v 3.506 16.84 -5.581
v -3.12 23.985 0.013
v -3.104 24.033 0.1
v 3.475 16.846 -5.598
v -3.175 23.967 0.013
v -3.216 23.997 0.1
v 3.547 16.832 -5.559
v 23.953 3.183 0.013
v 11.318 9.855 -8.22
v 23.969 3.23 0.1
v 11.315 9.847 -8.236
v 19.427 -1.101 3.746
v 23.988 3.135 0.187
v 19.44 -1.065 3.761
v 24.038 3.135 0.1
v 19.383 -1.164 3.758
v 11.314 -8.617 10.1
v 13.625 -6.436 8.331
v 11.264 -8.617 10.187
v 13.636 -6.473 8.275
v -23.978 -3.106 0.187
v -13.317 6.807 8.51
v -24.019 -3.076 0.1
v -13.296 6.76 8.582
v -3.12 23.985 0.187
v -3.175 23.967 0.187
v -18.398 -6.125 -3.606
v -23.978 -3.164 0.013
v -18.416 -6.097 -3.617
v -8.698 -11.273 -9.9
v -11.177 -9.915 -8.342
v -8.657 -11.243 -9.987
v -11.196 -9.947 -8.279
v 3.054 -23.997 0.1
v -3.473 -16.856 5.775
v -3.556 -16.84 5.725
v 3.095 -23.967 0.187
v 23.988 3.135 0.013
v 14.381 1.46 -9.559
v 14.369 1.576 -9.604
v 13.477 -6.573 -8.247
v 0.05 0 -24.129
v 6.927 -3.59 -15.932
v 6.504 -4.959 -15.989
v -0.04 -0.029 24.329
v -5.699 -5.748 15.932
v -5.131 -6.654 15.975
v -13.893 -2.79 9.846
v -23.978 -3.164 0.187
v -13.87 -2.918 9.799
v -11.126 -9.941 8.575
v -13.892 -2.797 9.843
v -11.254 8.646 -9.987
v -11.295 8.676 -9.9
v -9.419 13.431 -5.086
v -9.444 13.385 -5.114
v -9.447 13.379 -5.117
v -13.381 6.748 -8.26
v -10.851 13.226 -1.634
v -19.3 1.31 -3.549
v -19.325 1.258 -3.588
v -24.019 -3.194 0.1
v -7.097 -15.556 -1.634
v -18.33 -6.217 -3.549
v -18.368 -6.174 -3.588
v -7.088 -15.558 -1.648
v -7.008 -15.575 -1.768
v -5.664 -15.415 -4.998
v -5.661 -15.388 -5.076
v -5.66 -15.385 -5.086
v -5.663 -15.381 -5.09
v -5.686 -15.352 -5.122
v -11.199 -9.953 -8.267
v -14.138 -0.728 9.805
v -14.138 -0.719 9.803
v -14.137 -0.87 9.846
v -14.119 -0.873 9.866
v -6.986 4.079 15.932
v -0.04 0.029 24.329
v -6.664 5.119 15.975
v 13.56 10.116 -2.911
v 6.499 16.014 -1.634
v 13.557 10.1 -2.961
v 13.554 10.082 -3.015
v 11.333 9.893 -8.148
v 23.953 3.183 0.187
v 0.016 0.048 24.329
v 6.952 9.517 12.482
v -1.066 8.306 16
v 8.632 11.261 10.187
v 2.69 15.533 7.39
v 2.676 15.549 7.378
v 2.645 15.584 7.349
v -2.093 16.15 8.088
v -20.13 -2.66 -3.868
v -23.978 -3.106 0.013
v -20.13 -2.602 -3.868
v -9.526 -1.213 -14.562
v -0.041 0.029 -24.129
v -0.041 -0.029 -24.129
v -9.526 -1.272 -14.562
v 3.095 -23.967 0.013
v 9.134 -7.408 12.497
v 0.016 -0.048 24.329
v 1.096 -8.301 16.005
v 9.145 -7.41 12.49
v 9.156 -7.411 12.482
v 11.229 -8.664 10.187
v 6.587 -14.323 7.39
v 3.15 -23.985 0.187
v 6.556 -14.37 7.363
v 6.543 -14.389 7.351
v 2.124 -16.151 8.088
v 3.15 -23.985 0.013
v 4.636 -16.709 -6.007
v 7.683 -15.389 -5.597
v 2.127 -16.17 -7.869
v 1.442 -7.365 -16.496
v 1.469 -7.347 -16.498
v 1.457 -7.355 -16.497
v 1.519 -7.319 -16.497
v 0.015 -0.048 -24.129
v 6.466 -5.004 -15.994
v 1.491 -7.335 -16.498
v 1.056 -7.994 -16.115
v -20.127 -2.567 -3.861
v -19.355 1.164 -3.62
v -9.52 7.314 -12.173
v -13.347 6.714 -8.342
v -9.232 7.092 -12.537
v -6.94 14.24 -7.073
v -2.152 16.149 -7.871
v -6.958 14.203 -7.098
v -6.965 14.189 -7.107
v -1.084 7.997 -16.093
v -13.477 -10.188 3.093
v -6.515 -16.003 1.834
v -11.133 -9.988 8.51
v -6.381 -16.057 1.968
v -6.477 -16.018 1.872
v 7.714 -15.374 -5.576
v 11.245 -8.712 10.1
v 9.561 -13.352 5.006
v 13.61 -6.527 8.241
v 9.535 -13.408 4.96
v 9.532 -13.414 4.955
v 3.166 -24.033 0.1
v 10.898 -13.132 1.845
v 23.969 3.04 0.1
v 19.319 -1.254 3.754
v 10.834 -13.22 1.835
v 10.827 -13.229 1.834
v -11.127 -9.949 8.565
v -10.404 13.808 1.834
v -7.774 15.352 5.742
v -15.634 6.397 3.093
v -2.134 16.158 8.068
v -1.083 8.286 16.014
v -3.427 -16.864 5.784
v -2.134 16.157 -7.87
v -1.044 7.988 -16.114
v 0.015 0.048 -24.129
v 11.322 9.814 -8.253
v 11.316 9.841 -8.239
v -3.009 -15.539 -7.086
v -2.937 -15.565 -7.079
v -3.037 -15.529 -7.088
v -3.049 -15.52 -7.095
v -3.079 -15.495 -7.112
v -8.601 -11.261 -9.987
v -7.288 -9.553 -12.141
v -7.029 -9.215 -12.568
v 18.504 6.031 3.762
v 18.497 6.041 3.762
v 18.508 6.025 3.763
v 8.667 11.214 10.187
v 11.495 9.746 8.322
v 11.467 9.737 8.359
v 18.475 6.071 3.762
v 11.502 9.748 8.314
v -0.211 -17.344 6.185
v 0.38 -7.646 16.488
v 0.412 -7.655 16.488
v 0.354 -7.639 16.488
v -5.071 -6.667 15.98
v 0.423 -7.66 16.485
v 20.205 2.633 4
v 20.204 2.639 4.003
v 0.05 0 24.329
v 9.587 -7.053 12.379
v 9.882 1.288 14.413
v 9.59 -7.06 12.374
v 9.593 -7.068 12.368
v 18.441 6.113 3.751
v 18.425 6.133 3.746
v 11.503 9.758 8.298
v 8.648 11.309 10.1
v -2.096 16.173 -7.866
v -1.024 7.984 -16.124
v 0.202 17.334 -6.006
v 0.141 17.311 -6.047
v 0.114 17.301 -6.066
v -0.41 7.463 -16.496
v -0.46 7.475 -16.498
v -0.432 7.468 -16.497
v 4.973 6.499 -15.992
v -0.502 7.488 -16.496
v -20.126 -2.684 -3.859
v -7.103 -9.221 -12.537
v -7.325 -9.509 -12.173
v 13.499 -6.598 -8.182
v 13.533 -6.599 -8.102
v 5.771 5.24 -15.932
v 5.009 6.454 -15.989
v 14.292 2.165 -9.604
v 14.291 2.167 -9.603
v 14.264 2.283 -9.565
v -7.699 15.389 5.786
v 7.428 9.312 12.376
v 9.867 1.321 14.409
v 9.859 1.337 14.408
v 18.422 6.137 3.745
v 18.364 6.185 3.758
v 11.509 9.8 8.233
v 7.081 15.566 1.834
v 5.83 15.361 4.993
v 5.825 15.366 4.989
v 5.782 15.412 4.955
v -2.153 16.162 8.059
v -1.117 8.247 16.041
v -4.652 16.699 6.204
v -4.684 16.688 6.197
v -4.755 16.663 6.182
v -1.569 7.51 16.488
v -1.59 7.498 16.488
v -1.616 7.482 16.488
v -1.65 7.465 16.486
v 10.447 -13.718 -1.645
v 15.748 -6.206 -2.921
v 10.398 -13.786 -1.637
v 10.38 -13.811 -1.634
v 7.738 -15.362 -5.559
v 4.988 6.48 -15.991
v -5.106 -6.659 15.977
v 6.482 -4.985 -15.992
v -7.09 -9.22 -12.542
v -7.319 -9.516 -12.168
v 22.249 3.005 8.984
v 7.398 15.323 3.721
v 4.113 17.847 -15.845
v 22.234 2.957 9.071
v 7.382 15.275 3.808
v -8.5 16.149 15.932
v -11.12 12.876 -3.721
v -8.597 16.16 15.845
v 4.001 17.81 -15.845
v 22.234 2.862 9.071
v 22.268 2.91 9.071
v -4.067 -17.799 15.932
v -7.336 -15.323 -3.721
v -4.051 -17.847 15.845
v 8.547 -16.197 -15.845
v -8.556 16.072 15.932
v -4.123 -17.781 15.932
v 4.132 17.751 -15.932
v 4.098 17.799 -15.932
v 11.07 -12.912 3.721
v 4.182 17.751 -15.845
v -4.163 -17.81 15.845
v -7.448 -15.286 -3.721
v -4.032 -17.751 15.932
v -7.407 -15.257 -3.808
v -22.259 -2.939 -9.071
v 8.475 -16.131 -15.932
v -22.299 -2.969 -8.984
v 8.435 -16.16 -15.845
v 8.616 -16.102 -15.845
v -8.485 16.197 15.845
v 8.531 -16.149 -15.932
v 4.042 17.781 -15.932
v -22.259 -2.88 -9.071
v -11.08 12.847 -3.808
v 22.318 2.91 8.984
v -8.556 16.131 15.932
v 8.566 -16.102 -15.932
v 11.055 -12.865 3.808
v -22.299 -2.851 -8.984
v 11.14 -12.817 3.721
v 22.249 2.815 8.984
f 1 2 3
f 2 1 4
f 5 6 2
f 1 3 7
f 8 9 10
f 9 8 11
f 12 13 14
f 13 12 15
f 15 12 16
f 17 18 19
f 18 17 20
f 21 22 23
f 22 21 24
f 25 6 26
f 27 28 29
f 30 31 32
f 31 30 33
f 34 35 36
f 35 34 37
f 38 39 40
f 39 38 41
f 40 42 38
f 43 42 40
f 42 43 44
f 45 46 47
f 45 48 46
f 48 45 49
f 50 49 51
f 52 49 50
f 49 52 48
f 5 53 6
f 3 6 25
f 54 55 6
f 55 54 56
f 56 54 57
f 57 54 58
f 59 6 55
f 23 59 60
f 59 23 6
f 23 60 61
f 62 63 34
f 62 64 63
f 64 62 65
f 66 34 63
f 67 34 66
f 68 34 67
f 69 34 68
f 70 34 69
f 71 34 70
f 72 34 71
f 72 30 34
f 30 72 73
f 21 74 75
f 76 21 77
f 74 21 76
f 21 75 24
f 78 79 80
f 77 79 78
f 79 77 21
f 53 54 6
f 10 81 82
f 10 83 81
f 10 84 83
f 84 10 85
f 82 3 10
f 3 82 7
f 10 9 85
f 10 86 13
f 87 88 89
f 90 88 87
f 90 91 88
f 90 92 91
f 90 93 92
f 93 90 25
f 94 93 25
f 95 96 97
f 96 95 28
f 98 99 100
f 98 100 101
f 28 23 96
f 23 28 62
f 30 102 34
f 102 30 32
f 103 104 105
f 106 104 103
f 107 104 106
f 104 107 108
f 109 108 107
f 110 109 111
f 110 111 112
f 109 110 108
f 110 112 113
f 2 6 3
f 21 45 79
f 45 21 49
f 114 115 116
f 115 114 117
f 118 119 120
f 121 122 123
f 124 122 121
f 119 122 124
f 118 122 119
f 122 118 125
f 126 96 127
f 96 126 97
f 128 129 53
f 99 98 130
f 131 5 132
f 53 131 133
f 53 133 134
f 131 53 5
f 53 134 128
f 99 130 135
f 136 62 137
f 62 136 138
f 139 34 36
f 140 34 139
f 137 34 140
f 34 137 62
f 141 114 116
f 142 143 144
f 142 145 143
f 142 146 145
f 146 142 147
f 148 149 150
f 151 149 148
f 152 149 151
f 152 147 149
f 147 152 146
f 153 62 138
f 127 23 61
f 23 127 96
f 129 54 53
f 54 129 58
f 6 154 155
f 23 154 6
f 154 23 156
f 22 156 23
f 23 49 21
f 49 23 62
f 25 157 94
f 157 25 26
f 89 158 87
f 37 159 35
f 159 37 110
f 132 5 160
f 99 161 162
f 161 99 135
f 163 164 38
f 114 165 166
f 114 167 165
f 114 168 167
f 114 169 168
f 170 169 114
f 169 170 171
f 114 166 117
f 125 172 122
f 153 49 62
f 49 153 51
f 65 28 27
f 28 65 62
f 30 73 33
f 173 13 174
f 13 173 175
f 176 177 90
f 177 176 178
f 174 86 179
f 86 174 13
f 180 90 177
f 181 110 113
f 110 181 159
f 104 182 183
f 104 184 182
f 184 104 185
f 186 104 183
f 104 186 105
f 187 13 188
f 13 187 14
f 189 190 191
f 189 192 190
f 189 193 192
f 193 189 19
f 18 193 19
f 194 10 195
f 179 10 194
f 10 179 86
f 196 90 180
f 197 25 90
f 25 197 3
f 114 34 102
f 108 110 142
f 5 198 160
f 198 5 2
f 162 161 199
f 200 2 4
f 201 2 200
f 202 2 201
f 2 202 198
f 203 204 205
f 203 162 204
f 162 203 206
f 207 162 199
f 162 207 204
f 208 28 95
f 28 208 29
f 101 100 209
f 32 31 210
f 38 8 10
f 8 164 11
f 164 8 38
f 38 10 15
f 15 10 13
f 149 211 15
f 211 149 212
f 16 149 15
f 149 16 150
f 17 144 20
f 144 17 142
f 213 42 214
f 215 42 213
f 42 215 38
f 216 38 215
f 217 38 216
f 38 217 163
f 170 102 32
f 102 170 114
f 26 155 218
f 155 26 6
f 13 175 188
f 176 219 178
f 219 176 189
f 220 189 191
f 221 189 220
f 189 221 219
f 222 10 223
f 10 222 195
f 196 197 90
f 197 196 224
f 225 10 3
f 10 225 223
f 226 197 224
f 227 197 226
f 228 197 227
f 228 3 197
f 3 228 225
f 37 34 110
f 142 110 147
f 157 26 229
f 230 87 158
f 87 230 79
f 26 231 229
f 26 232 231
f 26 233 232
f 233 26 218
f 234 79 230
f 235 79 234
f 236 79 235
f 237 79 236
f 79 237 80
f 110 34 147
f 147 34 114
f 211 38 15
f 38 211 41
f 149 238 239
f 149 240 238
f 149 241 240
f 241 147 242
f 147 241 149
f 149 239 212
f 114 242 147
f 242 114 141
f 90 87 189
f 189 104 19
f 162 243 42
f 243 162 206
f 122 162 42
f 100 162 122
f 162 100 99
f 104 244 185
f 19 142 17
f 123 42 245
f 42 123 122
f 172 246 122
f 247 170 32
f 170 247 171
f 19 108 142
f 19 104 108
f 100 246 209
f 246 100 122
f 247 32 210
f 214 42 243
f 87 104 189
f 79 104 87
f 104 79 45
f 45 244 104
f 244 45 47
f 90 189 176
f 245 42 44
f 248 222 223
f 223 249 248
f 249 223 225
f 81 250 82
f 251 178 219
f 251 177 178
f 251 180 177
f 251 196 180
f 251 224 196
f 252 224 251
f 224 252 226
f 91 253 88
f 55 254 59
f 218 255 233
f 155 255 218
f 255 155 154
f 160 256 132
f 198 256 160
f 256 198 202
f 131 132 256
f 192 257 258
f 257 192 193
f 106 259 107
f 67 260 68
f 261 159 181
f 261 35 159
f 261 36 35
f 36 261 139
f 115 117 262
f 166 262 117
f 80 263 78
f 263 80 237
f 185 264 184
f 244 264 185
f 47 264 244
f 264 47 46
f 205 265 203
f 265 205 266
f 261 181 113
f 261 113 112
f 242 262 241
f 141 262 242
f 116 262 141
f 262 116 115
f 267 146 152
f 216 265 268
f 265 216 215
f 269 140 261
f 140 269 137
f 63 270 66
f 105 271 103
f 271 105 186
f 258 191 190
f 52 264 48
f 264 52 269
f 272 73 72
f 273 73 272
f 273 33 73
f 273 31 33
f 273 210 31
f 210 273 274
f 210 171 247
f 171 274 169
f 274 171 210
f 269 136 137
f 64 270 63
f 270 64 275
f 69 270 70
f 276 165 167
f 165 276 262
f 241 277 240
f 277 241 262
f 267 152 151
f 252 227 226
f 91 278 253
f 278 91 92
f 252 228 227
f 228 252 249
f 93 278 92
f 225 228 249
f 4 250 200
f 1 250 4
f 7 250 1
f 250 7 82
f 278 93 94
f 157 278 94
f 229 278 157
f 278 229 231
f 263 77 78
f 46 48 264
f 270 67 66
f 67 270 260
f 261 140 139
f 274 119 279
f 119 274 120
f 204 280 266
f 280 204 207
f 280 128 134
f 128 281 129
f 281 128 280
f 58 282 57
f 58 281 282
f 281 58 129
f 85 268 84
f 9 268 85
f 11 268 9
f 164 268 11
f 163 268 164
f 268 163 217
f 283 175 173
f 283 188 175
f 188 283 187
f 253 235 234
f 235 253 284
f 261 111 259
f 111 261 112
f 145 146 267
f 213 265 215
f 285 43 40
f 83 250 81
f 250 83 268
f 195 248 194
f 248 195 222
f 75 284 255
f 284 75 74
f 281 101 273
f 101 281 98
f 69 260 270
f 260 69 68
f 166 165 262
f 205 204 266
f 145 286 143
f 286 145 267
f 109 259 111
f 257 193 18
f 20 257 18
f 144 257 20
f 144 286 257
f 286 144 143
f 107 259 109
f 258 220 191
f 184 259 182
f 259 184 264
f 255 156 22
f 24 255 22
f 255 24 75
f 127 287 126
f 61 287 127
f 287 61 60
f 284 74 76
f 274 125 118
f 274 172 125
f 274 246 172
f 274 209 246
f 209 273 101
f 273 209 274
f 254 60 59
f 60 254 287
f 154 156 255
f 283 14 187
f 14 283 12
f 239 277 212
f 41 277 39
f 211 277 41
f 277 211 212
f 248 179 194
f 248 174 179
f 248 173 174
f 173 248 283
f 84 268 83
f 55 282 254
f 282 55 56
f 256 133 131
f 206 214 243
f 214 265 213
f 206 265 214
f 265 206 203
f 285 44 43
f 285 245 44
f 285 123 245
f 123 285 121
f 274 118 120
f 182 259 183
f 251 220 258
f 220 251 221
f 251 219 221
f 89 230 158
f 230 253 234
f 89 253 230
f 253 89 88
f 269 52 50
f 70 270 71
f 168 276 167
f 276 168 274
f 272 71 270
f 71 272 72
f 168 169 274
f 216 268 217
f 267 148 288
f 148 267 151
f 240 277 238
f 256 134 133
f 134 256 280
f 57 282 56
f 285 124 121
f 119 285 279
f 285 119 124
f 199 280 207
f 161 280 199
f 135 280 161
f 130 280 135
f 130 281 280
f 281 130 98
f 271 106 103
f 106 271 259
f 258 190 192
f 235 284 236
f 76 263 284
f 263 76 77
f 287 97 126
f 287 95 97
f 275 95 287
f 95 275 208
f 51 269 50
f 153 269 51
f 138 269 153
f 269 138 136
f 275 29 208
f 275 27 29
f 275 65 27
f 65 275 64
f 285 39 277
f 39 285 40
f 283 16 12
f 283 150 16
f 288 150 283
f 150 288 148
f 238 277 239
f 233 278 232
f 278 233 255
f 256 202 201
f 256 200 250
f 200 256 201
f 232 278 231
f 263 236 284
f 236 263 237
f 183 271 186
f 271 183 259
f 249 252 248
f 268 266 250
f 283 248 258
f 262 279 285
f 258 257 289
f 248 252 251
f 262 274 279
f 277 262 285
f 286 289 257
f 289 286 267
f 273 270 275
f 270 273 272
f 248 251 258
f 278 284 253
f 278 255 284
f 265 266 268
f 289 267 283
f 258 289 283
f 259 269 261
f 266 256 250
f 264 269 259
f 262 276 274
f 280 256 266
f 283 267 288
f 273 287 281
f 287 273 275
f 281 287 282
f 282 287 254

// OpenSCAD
// Auto-generated OpenSCAD file

    inner_points = 10*[[-2.221843475110553, -0.29097946152346194, -0.8984262072237021], [2.221843475110553, 0.29097946152346194, 0.8984262072237021], [0.40822934998208266, 1.7751470882990328, -1.5844963671346368], [-0.40822934998208266, -1.7751470882990328, 1.5844963671346368], [0.8515794118389997, -1.6101586544875546, -1.5844963671327748], [-0.8515794118389997, 1.6101586544875546, 1.5844963671327748], [-0.3984878257182108, -0.05218719241562808, -1.6847800894188376], [1.442147576003708, 0.18886808625444818, -0.9404994497718814], [-1.103959309361045, 1.2817119121066907, -0.37214031982424955], [0.7366760923608737, 1.522767190776767, 0.3721403198227068], [-0.7366760923608737, -1.522767190776767, -0.3721403198227068], [1.103959309361045, -1.2817119121066907, 0.37214031982424955], [-1.442147576003708, -0.18886808625444818, 0.9404994497718814], [0.3984878257182108, 0.05218719241562808, 1.6847800894188376]];

    outer_points_unshifted = 10*[[2.3937726471049503, 0.313495835182863, -6.43015375372423e-06], [-2.3937726471049503, -0.313495835182863, 6.43015375372423e-06], [6.485062154546661e-06, 0.0, 2.4142135623643846], [-6.485062154546661e-06, 0.0, -2.4142135623643846], [0.31349583518173196, -2.393772647113587, -8.421127310518333e-07], [-0.31349583518173196, 2.393772647113587, 8.421127310518333e-07], [1.1213900085490662, -0.8616788689919702, 0.9999969877249849], [-0.8616761827881642, -1.121387322352415, 1.0000023146387709], [0.8616815551895586, 1.121387322352415, 0.9999976853540135], [-1.1213846361476718, 0.8616788689919702, 1.0000030122677992], [1.1213846361476718, -0.8616788689919702, -1.0000030122677992], [-0.8616815551895586, -1.121387322352415, -0.9999976853540135], [0.8616761827881642, 1.121387322352415, -1.0000023146387709], [-1.1213900085490662, 0.8616788689919702, -0.9999969877249849]];
    
    shift = 0.1;
    
    outer_points = [for (p = outer_points_unshifted) [p[0], p[1], p[2] + shift]];

    // Convex hull for inner set (I)
    module inner_hull() {
        hull() {
            for (p = inner_points) {
                translate(p) sphere(r=0.1);
            }
        }
    }

    // Convex hull for outer set (O) minus inner hull (O \ I)
    module outer_minus_inner() {
        difference() {
            hull() {
                for (p = outer_points) {
                    translate(p) sphere(r=0.1);
                }
            }
            inner_hull(); // Subtract inner hull
        }
    }

    // Convex hull for outer set (O) minus all translated inner hulls
    module outer_minus_AllTranslationInner() {
        difference() {
            hull() {
                for (p = outer_points) {
                    translate(p) sphere(r=0.1);
                }
            }
            hull() {
                translate([0,0,50]) inner_hull();
                translate([0,0,-50]) inner_hull();
            }; // Subtract translated inner hulls
        }
    }

    // Difference between outer_minus_inner and outer_minus_AllTranslationInner
    module outer_minus_inner_diff() {
        difference() {
            // Outer minus inner
            difference() {
                hull() {
                    for (p = outer_points) {
                        translate(p) sphere(r=0.1);
                    }
                }
                inner_hull();
            }

            // Subtract Outer minus AllTranslationInner
            difference() {
                hull() {
                    for (p = outer_points) {
                        translate(p) sphere(r=0.1);
                    }
                }
                hull() {
                    translate([0,0,50]) inner_hull();
                    translate([0,0,-50]) inner_hull();
                };
            }
        }
    }

    // Rendering all with colors applied
    color([1, 0, 0, 0.5]) inner_hull(); // Transparent red
    // color([0, 0, 1, 1]) outer_minus_inner(); // Opaque blue
    color([0, 1, 0, 1]) outer_minus_AllTranslationInner(); // Opaque green
    color([1, 1, 0, 1]) outer_minus_inner_diff(); // Opaque yellow
    
